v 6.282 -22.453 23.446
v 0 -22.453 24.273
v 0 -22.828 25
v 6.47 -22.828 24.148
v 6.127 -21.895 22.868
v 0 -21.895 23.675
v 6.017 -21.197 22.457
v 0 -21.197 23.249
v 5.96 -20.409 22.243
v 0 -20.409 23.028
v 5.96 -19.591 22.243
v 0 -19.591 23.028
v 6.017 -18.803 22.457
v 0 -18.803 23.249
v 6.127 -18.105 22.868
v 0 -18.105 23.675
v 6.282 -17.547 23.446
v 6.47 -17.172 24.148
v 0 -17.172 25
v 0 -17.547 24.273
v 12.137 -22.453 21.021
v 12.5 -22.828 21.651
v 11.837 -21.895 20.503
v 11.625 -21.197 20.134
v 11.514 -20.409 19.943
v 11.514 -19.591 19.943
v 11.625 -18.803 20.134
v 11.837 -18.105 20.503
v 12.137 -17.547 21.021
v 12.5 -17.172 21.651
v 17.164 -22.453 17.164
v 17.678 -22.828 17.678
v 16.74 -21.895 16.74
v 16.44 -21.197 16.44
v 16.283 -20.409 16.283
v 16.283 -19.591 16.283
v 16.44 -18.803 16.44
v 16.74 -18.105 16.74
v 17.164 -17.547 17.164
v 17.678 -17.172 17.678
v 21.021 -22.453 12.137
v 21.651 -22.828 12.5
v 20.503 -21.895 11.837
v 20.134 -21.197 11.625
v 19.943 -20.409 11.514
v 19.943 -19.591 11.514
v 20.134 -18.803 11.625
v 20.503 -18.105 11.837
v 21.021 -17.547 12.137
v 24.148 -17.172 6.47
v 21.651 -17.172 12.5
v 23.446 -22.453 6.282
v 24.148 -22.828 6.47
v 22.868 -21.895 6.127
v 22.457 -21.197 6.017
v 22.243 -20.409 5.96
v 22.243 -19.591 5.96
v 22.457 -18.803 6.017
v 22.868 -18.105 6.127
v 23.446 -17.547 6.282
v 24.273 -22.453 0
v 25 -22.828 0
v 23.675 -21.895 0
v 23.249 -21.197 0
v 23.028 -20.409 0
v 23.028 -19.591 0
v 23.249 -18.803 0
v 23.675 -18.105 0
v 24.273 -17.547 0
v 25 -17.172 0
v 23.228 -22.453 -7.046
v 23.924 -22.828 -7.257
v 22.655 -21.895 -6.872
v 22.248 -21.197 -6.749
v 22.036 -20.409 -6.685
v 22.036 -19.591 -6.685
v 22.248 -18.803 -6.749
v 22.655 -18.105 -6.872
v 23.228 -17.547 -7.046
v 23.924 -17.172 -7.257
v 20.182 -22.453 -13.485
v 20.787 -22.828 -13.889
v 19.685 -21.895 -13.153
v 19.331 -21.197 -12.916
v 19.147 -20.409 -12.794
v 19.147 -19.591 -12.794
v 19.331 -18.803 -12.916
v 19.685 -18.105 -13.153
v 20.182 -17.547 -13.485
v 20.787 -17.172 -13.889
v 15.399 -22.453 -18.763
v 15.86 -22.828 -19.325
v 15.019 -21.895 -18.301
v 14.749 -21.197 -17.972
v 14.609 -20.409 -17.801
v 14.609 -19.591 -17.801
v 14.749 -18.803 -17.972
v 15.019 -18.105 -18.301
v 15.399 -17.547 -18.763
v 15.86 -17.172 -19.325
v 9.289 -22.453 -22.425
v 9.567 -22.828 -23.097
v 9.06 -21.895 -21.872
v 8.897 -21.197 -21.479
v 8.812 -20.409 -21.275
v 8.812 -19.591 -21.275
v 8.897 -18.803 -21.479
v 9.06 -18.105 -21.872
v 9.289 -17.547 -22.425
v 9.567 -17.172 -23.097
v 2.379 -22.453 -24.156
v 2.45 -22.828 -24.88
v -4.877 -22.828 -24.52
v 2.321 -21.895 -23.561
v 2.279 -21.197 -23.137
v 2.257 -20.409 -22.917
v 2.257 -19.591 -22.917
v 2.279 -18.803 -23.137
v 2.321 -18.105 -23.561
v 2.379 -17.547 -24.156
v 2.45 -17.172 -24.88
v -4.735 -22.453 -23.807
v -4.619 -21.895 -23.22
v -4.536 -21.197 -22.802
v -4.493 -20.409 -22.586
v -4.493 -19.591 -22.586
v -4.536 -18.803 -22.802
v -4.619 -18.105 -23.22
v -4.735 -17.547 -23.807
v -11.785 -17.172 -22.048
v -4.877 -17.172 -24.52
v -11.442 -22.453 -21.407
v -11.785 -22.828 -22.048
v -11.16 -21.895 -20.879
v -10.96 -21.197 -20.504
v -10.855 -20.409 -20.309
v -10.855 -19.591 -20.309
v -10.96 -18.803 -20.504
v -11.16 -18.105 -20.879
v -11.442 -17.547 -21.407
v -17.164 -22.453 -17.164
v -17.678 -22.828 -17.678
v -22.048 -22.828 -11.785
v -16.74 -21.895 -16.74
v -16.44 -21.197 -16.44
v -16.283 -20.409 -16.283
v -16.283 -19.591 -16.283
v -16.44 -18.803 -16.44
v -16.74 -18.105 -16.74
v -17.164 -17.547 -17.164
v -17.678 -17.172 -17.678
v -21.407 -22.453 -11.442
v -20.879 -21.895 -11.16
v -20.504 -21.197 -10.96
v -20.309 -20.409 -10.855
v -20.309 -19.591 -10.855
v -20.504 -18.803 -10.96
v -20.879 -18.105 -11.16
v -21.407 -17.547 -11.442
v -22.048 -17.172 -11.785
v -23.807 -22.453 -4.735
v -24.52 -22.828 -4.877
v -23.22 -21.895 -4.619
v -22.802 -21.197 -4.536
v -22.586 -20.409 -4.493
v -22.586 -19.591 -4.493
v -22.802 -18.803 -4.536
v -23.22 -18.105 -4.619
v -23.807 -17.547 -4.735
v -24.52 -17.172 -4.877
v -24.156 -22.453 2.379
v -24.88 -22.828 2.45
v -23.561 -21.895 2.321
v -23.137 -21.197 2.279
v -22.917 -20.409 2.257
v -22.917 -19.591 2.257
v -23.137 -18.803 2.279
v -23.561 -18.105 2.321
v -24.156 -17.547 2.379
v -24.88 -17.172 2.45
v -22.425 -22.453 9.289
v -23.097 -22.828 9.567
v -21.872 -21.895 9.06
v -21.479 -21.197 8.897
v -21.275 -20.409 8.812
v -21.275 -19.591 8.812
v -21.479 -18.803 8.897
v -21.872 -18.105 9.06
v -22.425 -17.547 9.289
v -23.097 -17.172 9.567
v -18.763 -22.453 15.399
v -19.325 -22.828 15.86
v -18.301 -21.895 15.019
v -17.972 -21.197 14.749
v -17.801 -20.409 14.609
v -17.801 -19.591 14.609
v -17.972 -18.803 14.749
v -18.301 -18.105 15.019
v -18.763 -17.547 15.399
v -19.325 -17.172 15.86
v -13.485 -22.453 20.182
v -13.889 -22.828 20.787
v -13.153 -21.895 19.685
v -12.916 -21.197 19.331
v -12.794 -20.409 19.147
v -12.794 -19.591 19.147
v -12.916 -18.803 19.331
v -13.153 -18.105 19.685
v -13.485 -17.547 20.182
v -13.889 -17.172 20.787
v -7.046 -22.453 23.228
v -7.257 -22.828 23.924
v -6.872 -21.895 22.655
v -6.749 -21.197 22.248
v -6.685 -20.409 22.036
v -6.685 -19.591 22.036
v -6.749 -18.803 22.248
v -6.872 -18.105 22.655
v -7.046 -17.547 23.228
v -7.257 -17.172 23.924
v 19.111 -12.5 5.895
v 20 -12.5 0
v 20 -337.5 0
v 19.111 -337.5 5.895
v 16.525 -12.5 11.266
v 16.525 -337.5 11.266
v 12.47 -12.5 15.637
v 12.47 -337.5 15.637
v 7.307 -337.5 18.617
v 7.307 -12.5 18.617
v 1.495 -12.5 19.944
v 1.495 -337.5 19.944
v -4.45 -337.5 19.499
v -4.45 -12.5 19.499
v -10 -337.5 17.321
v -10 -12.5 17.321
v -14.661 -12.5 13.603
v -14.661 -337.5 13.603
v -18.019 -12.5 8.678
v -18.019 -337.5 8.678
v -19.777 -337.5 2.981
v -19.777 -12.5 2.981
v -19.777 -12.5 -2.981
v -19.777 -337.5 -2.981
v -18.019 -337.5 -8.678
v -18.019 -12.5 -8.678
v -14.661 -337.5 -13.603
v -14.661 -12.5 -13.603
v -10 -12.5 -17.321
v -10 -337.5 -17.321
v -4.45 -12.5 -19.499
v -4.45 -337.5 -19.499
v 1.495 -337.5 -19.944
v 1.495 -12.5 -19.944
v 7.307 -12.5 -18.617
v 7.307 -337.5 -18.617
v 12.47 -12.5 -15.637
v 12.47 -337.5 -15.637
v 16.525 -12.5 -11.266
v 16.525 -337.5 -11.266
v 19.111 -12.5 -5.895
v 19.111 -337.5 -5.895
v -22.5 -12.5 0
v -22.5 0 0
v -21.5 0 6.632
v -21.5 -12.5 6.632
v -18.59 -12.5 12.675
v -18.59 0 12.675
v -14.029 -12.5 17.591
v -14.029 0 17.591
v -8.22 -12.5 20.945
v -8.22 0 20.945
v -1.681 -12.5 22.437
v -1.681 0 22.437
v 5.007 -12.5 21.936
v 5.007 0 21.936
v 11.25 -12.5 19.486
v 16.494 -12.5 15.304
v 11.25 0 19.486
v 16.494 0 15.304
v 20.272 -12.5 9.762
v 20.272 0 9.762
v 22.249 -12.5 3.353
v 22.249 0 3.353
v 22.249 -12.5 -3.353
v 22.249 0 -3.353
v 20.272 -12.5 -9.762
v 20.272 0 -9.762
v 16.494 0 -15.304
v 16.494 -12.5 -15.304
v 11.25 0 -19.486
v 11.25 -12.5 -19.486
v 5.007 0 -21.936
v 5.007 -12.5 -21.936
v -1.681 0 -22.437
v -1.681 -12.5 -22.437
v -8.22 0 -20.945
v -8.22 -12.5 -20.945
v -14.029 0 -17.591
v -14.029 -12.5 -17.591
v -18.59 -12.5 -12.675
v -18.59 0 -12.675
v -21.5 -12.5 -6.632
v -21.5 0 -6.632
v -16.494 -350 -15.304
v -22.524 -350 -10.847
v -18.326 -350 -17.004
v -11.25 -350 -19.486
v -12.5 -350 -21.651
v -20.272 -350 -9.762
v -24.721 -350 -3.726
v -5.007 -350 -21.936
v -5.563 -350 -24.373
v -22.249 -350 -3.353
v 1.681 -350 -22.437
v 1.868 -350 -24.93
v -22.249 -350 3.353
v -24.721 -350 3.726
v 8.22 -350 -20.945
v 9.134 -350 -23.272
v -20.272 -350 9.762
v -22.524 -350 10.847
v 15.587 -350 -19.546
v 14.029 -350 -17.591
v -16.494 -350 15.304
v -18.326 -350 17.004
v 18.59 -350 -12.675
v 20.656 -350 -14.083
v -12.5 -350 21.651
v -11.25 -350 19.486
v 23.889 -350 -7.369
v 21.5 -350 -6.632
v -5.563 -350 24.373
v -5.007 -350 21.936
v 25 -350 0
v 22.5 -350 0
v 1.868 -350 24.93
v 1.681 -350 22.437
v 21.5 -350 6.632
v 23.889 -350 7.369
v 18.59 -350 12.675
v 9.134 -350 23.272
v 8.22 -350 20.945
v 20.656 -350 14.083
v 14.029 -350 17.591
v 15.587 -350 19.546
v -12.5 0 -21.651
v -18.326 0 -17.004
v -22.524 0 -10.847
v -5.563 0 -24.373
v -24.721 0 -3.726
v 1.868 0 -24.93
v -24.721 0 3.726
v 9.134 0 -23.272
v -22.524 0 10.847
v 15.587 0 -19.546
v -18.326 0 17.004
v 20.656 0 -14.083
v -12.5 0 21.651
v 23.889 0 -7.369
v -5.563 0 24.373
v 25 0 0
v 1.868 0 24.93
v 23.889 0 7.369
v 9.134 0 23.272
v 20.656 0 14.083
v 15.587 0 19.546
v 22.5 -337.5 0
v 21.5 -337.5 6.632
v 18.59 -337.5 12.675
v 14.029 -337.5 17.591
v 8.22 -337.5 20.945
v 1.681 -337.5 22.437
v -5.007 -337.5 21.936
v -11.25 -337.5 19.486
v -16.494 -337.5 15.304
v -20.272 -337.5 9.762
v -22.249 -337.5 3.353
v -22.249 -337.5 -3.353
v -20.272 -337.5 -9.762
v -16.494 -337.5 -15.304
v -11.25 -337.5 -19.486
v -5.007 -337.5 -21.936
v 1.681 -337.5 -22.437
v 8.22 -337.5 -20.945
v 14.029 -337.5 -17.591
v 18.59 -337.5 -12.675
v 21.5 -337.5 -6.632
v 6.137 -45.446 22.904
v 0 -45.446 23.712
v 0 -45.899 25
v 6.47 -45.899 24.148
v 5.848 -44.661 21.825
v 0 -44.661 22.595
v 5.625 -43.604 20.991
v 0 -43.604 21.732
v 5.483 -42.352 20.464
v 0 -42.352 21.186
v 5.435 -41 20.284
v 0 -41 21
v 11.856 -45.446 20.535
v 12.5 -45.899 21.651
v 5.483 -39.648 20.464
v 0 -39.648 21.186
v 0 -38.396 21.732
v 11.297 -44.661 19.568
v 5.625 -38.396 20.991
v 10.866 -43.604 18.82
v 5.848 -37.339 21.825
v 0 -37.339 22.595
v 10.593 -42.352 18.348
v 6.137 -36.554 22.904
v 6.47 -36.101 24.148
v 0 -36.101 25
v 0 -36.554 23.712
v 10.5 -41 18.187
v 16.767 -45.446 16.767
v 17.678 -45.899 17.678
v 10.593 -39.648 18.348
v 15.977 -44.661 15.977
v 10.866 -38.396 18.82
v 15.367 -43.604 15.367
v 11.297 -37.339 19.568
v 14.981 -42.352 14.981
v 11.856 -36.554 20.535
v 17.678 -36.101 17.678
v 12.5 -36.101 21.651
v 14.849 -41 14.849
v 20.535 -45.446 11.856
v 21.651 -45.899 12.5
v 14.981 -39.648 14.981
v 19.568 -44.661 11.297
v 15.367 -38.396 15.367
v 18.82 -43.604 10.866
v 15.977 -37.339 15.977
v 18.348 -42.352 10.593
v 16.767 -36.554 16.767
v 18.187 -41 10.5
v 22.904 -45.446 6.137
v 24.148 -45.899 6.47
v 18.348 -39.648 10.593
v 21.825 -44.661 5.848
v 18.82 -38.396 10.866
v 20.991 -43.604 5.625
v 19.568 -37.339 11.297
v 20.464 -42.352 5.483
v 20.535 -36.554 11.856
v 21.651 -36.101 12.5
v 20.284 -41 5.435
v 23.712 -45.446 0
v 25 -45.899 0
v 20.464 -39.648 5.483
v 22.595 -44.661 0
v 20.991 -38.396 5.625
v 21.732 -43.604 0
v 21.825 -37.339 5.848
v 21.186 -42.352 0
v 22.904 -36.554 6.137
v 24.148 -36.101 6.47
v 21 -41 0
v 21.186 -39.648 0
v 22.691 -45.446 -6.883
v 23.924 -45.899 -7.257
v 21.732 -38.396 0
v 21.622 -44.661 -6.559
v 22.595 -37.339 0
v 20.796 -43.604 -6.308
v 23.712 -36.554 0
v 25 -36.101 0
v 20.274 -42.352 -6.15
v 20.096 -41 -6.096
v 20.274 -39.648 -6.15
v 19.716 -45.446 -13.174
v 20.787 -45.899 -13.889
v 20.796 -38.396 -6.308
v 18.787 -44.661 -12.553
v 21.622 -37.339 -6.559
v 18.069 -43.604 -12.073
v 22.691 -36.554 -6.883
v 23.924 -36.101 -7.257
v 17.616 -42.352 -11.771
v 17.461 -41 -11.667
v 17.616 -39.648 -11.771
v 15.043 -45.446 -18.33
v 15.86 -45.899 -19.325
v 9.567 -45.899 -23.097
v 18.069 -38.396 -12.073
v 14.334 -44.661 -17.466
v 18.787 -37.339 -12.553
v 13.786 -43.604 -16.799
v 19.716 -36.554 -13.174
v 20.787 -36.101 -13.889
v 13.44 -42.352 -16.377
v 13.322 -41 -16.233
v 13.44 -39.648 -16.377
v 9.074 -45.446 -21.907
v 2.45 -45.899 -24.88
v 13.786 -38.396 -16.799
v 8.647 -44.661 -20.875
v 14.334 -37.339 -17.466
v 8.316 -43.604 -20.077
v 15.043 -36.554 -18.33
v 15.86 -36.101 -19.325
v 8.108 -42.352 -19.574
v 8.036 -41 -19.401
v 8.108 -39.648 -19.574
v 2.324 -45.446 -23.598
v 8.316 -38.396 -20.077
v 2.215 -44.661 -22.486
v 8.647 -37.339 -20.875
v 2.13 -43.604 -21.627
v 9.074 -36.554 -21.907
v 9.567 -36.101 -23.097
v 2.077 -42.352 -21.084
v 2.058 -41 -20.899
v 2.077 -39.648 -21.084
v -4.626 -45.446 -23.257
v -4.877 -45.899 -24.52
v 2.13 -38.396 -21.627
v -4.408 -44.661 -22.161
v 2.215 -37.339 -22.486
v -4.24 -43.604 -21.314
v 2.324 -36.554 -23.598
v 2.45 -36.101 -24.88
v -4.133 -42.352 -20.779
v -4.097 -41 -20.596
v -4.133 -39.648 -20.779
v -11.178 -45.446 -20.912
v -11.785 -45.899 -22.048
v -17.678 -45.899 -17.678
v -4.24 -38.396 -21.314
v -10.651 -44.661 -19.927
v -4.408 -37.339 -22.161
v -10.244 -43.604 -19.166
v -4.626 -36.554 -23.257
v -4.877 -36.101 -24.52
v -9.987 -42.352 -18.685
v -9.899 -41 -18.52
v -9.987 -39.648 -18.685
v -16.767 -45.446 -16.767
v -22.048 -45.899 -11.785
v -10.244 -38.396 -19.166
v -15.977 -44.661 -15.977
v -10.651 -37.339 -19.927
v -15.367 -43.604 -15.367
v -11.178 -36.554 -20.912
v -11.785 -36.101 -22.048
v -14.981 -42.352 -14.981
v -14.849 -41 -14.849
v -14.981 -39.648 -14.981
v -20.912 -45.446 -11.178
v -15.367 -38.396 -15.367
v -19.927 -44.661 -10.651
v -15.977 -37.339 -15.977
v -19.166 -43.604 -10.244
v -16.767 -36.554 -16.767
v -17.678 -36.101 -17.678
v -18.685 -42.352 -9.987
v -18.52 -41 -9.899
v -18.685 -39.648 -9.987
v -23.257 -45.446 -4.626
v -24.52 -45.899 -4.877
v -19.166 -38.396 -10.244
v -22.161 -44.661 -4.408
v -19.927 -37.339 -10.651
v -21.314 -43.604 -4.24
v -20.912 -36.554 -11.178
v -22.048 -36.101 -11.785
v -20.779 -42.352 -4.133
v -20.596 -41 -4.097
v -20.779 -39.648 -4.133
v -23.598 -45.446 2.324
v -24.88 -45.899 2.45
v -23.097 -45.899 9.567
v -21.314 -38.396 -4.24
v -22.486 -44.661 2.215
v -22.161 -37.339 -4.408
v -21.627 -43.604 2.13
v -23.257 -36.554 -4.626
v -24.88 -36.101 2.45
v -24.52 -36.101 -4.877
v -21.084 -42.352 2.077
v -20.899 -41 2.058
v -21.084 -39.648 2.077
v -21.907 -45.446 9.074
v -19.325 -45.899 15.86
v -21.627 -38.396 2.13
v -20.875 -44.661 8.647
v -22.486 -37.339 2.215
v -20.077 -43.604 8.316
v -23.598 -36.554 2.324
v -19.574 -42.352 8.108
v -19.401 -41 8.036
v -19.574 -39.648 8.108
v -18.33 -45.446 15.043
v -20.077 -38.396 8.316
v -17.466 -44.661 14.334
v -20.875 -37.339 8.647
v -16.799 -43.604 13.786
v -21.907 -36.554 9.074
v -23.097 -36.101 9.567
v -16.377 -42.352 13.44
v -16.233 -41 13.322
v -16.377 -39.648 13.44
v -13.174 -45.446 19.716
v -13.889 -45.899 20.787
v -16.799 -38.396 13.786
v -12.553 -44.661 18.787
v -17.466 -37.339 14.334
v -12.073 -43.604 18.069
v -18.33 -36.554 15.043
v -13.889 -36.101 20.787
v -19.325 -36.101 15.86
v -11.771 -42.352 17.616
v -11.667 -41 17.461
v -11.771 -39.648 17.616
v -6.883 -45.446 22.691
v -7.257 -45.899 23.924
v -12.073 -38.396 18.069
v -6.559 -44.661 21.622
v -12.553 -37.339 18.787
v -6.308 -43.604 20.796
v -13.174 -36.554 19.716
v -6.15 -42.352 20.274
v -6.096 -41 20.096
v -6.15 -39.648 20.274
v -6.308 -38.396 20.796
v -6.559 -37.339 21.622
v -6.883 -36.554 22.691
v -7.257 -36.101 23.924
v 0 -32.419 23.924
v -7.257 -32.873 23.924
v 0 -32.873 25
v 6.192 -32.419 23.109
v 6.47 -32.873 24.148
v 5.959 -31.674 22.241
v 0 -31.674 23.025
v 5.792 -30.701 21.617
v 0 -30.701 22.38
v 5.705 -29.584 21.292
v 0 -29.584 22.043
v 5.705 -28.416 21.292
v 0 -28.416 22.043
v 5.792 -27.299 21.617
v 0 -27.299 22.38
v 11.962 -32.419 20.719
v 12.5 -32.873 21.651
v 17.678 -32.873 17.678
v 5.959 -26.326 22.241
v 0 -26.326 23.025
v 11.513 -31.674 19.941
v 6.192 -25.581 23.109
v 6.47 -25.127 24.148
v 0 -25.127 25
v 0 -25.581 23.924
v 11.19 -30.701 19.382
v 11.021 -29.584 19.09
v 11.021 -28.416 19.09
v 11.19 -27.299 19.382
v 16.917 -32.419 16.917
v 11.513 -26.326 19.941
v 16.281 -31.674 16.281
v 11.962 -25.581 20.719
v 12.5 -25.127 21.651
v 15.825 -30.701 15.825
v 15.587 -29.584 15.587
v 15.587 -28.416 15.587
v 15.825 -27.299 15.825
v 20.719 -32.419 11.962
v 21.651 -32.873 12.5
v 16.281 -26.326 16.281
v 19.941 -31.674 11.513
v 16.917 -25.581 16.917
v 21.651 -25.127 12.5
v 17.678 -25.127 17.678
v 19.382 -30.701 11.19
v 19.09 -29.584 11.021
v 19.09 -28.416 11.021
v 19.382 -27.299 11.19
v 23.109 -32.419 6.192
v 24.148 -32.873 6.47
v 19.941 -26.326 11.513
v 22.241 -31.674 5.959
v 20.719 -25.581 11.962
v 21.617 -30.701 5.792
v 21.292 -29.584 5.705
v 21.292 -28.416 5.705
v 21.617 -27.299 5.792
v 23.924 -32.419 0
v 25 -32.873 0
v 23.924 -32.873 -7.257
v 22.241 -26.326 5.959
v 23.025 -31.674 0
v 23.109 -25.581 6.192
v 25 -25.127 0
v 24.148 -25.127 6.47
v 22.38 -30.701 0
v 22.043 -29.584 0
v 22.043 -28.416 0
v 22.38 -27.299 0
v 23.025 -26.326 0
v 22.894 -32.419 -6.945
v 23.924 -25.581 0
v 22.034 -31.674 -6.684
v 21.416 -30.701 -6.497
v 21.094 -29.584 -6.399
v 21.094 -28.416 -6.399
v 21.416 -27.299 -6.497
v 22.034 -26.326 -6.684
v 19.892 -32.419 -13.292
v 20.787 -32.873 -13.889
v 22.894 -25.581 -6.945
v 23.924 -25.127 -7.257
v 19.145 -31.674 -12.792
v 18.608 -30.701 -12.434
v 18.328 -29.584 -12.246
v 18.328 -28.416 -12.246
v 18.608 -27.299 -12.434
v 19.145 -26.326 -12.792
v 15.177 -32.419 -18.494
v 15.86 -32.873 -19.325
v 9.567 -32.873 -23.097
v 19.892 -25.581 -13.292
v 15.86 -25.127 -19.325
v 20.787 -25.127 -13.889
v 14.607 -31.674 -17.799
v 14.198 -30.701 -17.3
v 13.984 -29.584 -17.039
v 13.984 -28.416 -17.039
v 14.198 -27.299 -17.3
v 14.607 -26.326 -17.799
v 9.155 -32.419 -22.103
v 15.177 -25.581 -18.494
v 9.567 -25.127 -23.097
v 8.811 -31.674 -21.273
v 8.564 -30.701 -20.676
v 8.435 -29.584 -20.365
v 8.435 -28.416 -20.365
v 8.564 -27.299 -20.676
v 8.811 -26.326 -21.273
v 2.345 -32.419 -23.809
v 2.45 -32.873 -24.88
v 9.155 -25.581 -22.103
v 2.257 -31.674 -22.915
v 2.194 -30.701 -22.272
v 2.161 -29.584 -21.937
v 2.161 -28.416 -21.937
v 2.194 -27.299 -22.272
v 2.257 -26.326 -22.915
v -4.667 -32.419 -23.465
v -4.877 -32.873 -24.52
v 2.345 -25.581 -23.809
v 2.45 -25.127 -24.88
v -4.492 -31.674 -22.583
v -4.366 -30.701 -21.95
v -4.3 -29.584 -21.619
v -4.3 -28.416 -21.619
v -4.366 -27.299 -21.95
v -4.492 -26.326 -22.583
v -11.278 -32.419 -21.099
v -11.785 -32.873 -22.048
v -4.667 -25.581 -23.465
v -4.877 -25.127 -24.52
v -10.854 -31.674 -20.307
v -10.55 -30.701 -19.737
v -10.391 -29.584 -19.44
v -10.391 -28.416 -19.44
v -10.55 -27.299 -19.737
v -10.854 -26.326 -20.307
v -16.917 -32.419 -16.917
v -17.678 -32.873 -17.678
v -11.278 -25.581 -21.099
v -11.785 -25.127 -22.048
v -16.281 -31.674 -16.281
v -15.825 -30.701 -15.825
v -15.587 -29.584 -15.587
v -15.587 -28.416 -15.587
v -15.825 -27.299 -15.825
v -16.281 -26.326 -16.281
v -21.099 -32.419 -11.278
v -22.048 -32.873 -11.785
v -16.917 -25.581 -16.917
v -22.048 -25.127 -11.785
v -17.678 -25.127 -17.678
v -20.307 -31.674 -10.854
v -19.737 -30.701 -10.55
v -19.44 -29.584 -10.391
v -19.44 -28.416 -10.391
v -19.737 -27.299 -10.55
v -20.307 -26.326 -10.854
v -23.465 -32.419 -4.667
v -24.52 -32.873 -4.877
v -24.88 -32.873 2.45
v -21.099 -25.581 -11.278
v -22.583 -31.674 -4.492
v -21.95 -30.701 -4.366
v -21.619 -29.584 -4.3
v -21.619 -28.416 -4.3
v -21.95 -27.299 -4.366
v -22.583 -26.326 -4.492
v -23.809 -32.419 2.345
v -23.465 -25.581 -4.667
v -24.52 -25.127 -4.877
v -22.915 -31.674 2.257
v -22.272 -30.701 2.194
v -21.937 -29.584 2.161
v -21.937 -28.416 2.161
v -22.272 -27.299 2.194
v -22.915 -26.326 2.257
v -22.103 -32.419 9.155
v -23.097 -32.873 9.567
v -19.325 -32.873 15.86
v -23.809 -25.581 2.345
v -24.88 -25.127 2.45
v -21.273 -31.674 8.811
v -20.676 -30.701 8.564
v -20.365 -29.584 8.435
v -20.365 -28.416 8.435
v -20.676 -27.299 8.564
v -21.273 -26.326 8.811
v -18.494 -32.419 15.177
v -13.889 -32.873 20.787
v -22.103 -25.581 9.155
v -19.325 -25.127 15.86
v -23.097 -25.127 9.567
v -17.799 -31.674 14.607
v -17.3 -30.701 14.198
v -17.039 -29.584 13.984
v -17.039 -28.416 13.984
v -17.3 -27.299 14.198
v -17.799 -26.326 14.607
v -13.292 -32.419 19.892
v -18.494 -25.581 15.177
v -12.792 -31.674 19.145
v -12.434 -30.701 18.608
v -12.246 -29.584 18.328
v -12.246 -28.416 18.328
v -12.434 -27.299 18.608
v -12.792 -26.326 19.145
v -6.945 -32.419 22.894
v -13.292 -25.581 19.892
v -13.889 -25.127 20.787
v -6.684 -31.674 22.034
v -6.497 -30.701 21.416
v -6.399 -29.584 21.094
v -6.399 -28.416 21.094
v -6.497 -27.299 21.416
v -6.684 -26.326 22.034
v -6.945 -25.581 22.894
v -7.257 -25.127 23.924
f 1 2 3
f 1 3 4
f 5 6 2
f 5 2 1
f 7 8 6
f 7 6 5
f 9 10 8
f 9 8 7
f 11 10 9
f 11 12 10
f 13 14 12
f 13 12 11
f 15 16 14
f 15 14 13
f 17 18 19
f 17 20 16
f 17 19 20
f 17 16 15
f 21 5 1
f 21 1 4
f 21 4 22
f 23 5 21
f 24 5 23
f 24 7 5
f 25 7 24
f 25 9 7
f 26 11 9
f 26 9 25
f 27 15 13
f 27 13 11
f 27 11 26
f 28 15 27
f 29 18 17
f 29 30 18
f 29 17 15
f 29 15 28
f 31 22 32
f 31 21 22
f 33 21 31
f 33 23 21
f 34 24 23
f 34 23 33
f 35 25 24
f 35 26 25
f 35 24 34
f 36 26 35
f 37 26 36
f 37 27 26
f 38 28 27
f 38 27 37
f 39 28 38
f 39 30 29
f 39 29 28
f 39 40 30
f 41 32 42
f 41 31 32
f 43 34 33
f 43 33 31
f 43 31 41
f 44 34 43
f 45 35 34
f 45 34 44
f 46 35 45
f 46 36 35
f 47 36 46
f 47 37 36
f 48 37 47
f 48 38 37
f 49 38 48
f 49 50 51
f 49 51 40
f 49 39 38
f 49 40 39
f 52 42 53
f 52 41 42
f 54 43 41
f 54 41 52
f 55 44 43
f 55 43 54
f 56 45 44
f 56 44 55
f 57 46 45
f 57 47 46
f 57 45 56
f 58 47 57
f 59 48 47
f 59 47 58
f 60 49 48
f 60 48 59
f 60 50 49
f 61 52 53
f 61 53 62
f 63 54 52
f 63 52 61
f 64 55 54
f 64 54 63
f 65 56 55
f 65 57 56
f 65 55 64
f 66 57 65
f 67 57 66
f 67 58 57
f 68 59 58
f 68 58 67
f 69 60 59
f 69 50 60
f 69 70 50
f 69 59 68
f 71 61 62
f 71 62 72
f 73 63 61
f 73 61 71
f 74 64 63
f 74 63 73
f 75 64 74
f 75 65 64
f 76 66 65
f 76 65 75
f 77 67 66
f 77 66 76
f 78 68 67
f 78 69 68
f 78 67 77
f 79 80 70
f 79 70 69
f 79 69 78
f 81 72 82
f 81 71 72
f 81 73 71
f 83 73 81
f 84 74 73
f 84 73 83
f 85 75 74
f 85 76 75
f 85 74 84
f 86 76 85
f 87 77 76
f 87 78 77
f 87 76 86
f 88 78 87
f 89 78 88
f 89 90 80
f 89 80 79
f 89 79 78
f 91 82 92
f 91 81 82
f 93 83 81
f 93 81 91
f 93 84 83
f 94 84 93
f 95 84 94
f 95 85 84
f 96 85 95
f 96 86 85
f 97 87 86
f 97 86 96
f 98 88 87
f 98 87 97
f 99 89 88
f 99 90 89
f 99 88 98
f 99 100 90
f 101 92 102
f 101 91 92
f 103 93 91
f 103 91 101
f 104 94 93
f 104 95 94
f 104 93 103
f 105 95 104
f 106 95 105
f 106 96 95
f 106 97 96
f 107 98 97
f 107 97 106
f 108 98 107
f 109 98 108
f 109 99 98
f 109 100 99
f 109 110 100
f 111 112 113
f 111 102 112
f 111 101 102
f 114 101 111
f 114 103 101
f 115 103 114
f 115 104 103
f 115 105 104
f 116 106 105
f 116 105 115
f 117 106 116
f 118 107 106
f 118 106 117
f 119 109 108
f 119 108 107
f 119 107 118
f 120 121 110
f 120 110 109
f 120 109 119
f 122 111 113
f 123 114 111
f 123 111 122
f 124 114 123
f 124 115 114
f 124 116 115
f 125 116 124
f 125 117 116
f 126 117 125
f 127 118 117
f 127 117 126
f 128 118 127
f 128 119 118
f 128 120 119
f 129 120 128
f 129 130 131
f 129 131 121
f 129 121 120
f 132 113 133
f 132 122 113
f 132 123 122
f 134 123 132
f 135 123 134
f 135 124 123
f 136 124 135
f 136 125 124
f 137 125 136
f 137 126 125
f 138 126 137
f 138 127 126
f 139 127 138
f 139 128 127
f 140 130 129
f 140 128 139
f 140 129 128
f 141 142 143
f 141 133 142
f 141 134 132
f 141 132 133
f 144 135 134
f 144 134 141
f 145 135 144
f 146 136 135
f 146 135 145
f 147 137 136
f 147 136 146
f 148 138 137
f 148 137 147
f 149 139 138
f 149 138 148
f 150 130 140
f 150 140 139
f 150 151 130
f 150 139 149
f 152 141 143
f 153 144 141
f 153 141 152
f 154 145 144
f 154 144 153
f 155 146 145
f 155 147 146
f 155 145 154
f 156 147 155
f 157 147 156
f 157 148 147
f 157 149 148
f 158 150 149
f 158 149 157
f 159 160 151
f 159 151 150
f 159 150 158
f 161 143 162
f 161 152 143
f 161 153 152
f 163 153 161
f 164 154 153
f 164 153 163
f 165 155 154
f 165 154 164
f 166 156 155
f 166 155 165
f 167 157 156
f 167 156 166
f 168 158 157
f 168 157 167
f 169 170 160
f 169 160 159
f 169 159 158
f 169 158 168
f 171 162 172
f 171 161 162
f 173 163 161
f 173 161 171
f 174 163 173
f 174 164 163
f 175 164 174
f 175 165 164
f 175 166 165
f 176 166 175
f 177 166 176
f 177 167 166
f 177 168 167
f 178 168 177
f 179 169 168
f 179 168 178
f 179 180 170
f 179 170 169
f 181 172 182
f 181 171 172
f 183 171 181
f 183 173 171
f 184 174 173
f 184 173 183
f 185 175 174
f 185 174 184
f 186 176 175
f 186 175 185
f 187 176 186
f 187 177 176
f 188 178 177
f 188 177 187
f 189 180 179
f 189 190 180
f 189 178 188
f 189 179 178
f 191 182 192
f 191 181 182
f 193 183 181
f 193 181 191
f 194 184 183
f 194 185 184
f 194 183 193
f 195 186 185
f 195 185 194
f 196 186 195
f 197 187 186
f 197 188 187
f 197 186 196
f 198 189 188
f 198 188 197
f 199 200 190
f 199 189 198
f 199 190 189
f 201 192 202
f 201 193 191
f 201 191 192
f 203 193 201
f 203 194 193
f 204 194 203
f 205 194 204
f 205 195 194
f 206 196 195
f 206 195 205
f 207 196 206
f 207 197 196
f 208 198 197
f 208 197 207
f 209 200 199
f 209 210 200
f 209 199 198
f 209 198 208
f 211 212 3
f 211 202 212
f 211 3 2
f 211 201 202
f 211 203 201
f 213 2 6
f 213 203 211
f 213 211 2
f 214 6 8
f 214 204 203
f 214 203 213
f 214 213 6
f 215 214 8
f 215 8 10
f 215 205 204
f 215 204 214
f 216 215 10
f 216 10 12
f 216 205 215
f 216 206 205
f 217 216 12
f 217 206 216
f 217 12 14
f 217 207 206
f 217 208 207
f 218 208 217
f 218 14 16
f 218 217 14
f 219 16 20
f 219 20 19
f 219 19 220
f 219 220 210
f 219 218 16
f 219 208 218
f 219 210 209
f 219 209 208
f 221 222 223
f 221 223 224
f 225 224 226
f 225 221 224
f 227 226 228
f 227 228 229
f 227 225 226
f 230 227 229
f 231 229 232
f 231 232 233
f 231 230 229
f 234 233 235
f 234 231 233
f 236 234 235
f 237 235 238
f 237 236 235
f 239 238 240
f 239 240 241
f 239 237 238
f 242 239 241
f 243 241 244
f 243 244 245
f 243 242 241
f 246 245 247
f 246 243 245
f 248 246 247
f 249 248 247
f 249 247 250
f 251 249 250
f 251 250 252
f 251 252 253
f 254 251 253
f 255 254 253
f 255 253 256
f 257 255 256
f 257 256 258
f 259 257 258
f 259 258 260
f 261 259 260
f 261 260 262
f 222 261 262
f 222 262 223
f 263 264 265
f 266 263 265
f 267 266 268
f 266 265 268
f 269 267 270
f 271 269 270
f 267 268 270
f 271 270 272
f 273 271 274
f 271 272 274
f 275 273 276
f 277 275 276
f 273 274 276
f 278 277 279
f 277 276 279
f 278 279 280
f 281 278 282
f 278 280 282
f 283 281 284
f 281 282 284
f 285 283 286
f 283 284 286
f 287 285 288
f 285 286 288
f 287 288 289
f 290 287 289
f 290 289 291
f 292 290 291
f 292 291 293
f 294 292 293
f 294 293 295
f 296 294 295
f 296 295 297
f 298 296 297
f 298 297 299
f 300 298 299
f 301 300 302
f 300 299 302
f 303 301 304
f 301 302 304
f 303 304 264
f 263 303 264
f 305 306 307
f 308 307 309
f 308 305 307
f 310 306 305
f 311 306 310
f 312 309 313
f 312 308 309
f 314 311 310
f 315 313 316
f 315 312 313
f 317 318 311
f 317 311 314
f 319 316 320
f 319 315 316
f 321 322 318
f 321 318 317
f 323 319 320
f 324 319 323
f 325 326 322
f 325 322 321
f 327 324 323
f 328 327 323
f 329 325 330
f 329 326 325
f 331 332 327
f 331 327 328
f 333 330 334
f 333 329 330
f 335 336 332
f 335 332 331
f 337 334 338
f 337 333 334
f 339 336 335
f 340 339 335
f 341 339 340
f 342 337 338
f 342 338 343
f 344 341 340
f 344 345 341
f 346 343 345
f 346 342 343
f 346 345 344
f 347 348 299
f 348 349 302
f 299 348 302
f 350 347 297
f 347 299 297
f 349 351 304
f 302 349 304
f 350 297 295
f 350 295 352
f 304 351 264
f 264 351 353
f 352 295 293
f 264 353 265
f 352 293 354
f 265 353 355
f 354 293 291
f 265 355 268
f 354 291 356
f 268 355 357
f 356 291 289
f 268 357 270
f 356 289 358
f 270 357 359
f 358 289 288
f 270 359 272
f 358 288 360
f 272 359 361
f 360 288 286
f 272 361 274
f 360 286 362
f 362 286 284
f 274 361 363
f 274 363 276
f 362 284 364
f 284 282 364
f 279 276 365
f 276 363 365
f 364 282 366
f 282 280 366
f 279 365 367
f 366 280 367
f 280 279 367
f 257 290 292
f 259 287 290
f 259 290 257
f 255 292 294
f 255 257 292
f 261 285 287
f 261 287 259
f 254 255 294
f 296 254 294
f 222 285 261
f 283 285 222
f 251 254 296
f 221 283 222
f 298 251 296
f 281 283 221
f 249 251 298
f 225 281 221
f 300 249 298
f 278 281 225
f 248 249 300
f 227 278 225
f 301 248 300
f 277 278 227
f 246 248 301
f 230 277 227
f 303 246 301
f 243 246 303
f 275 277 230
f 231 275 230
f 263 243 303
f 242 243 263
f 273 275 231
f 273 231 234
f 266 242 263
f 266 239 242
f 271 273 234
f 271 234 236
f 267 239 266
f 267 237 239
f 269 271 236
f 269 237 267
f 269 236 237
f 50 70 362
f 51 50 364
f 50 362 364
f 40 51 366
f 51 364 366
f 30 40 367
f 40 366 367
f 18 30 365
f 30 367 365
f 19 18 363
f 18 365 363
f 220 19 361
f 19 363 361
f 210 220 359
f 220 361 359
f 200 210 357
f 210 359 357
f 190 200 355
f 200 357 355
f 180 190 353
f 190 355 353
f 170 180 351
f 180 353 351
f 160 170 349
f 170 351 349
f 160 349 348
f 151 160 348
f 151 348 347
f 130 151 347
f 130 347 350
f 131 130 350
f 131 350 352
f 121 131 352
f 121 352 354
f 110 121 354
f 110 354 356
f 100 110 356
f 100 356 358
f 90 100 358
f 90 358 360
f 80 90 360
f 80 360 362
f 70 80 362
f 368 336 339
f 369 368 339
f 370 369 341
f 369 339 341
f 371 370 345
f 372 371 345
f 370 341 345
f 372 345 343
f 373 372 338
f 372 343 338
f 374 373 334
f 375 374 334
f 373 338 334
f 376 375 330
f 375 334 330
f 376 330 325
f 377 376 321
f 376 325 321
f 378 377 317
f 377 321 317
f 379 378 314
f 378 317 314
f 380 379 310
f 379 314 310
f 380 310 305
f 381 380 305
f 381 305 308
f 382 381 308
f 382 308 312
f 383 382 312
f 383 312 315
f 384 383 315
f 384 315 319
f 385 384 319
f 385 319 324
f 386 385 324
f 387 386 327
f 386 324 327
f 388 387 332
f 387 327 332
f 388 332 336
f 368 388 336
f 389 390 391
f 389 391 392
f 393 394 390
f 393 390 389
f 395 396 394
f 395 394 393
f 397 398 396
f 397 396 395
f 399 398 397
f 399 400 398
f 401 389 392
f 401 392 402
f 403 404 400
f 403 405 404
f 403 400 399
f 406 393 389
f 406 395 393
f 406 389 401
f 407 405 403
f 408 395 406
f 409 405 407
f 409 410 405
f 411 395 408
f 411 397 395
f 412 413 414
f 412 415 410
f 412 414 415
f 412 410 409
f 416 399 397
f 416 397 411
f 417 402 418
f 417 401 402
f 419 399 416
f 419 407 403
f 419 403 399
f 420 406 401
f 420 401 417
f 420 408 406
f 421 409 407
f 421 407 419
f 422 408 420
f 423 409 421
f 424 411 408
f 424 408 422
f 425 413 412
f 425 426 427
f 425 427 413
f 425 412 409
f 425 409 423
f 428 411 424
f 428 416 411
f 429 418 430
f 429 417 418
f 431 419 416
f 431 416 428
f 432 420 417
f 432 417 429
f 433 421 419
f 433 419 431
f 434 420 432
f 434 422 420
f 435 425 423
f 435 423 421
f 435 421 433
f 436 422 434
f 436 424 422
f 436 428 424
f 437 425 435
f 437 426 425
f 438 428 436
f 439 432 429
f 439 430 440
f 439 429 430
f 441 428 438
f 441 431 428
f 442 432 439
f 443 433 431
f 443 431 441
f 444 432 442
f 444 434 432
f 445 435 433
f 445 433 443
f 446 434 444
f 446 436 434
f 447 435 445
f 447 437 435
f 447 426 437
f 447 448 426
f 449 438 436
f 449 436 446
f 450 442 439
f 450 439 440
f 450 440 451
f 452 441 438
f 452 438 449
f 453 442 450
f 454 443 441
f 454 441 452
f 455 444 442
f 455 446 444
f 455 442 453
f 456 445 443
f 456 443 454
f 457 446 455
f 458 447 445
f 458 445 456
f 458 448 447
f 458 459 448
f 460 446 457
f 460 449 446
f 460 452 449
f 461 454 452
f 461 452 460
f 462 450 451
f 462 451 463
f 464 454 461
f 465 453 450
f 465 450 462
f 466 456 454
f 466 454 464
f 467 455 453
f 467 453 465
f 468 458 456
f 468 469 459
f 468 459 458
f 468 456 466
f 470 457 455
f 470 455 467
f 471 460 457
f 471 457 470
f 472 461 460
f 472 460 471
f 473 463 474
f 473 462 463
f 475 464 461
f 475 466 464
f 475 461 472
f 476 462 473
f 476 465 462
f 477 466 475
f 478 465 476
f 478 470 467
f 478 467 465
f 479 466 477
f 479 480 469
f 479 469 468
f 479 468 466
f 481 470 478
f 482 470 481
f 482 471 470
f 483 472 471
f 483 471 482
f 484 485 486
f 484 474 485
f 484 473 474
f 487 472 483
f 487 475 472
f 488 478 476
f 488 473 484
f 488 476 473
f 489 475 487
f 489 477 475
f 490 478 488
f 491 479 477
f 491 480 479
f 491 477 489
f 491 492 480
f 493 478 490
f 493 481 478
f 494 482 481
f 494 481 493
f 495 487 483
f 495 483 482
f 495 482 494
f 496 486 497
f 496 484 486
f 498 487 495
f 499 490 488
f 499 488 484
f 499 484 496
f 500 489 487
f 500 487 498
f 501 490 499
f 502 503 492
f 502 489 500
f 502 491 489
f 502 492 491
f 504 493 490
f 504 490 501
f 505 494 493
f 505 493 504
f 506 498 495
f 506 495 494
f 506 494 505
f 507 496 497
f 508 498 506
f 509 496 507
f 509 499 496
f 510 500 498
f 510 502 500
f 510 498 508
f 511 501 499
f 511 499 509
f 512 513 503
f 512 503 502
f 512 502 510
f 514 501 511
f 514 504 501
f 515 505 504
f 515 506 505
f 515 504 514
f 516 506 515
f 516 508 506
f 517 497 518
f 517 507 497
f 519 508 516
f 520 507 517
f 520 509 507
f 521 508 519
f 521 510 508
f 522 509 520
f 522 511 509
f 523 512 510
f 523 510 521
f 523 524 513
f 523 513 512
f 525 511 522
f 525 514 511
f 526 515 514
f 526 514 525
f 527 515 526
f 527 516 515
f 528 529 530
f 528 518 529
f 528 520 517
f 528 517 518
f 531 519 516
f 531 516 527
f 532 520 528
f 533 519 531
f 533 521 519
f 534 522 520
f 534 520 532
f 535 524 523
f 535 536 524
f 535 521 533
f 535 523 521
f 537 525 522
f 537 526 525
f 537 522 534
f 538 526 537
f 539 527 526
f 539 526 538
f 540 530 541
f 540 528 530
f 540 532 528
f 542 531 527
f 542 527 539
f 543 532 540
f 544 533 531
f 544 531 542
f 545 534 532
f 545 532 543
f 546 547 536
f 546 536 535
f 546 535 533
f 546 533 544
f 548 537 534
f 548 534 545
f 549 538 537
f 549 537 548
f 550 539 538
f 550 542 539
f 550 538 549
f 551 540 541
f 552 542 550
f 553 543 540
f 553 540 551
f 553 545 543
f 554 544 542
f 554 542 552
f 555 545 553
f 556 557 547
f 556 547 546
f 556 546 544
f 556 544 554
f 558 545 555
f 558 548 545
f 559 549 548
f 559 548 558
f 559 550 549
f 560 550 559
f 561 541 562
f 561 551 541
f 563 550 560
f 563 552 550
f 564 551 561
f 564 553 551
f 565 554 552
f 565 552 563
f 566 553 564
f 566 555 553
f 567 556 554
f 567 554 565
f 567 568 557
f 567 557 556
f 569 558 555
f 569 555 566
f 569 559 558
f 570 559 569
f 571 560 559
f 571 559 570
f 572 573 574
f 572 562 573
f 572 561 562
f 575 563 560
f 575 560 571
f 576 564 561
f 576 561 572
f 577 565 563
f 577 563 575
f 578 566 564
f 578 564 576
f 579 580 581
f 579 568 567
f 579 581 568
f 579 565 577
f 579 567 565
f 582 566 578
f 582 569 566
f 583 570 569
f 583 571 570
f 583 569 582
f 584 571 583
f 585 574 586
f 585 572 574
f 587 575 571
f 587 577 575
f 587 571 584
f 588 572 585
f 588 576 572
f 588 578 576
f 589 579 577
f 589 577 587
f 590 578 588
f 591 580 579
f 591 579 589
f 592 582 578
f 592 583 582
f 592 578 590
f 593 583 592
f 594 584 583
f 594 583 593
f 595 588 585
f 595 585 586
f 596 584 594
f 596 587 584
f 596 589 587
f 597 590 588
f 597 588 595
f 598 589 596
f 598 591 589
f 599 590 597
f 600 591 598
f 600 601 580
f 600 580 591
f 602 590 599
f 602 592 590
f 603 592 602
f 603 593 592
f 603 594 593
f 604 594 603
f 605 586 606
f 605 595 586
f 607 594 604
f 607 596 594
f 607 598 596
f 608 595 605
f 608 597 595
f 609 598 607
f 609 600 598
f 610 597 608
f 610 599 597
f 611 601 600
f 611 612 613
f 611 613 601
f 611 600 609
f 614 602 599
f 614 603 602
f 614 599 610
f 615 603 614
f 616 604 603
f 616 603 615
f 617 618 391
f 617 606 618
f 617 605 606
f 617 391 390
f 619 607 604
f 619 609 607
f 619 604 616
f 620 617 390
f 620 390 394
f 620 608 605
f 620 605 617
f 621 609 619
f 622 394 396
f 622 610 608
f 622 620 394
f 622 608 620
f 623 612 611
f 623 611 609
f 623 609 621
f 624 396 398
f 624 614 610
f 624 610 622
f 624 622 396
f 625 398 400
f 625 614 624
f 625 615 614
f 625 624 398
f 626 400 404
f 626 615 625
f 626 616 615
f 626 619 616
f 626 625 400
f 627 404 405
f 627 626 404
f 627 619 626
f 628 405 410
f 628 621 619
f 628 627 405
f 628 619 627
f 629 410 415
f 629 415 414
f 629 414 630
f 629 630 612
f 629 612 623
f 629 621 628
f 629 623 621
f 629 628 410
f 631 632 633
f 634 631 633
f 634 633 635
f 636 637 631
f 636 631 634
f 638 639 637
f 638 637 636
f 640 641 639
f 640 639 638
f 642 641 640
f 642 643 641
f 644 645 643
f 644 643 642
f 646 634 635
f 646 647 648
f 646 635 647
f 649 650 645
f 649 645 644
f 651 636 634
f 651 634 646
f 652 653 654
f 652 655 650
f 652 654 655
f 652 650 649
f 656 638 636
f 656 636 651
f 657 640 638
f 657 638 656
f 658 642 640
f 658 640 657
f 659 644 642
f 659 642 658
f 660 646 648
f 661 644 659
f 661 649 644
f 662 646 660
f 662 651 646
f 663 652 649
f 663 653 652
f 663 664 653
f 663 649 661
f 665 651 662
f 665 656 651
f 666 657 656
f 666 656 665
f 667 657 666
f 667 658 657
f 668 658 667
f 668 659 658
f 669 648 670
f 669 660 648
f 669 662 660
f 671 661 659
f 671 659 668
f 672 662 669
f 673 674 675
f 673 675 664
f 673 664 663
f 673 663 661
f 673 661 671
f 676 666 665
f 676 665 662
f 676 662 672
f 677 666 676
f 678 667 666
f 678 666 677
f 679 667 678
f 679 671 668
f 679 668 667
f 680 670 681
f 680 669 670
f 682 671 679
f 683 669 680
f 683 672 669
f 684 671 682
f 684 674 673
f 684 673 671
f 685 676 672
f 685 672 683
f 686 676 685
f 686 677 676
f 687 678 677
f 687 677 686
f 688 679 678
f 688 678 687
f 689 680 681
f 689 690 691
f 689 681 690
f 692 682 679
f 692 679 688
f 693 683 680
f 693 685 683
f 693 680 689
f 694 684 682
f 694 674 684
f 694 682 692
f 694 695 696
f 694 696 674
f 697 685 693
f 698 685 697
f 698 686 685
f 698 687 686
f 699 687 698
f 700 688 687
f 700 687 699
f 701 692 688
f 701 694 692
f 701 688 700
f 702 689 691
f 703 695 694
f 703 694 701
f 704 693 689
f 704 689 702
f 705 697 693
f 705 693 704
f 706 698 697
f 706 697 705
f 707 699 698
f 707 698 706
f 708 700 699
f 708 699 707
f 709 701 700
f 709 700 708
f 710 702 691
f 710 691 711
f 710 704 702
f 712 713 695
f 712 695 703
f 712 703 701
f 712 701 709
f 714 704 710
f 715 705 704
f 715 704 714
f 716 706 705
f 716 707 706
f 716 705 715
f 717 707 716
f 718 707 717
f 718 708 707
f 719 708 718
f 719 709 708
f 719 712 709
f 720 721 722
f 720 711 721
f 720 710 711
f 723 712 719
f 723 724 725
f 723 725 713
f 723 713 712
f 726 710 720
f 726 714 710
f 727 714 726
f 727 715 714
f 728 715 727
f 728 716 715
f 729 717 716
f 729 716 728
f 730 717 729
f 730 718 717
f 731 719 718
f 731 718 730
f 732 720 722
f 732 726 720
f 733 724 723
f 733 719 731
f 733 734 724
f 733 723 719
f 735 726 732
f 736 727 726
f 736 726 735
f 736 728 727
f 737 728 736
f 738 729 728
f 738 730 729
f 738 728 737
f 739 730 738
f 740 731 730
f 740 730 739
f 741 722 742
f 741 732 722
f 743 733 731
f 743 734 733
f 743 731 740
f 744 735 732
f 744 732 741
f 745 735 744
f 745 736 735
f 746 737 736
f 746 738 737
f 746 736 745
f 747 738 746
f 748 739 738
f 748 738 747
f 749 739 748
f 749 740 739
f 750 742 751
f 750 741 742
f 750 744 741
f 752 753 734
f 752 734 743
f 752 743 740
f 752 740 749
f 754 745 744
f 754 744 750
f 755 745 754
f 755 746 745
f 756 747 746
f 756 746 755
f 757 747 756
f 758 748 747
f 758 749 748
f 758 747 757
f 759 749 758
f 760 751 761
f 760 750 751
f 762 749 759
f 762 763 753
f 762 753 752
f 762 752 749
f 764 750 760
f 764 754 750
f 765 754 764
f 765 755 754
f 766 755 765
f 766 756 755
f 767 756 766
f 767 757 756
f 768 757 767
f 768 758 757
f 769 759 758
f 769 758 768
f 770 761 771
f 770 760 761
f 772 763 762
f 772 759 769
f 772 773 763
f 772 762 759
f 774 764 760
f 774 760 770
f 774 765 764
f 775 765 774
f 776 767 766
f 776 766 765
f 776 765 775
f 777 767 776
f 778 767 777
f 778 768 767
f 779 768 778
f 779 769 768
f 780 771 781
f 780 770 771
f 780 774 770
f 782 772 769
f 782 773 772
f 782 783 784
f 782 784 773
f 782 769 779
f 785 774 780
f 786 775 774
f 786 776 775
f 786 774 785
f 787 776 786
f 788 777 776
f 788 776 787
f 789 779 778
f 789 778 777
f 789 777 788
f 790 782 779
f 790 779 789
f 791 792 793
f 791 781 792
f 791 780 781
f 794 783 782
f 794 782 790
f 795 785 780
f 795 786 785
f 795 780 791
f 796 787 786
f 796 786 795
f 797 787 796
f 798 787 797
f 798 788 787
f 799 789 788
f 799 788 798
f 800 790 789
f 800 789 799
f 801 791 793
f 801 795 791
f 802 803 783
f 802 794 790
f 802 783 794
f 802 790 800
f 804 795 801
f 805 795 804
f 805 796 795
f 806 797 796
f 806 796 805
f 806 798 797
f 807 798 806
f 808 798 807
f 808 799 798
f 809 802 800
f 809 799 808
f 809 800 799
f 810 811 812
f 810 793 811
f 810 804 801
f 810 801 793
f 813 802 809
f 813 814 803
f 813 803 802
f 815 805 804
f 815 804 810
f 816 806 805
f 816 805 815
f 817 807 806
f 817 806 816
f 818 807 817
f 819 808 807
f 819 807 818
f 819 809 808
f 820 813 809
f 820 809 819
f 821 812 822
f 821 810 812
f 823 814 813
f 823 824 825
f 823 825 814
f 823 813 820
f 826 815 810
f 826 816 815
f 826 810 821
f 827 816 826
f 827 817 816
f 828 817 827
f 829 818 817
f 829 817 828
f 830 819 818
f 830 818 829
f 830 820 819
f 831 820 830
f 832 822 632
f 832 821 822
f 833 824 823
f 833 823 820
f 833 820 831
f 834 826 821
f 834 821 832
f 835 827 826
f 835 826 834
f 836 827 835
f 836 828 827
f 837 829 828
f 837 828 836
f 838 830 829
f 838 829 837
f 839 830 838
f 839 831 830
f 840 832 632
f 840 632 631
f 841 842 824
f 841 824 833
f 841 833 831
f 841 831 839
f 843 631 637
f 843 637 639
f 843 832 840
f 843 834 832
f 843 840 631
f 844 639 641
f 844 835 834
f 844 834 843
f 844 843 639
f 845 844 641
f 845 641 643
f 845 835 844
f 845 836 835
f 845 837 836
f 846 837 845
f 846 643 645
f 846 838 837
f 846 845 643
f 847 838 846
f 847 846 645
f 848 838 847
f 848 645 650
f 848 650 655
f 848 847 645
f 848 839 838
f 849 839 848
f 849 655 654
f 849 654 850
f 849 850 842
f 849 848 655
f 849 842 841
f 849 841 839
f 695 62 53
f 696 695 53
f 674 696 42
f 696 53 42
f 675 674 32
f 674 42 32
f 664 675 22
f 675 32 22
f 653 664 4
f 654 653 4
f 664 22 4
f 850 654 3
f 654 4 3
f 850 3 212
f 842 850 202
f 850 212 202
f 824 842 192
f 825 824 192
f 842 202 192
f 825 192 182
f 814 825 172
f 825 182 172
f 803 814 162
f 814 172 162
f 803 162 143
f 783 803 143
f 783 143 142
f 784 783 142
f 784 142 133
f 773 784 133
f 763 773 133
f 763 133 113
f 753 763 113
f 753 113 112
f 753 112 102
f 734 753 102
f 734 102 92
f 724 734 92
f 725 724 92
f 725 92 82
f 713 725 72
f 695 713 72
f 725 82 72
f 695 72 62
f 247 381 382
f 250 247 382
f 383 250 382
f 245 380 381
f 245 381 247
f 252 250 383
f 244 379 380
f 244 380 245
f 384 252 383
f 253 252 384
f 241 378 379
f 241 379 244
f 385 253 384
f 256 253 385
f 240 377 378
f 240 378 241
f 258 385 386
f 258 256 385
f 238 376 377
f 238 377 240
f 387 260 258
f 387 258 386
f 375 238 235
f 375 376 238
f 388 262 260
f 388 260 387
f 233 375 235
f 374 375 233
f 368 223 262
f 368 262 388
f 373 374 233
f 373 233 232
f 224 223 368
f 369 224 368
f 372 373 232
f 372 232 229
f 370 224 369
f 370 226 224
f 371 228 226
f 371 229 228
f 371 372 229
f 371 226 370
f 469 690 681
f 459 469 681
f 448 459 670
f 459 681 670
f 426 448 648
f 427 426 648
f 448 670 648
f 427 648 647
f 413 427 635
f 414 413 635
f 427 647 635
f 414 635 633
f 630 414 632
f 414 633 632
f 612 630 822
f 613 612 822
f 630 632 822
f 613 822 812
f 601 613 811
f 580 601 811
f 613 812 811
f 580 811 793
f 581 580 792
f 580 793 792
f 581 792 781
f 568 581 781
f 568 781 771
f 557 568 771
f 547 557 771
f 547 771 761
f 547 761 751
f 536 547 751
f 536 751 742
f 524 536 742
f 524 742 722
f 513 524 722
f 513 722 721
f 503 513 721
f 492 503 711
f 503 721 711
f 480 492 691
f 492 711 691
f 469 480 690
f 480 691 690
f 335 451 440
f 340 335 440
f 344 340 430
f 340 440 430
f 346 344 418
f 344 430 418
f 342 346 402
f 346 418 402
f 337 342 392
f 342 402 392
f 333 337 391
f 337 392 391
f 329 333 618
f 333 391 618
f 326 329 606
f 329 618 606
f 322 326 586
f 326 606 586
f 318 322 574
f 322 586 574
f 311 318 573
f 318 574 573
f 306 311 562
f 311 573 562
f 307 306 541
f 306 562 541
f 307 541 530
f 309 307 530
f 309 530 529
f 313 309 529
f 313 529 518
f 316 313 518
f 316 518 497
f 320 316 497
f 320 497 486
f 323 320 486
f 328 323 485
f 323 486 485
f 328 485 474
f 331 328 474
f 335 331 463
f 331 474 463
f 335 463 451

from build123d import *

# Parameters (mm, degrees)
F0_R     = 25
F0_R_2   = 20
F1_DEPTH = 350
F2_R     = 22.5
F2_R_2   = 20
F3_DEPTH = 12.5
F4_R     = 22.5
F4_R_2   = 20
F5_DEPTH = 12.5
F6_R     = 3
F6_R_2   = 4
F6_R_3   = 5


with BuildPart() as f1:
    # F0 (on Front) → F1 (new body)
    with BuildSketch(Plane.XZ):
        Circle(F0_R)
        Circle(F0_R_2, mode=Mode.SUBTRACT)
    extrude(amount=F1_DEPTH)

    # F2 (on face) → F3 (cut)
    with BuildSketch(Plane.XZ.offset(350)):
        Circle(F2_R)
        Circle(F2_R_2, mode=Mode.SUBTRACT)
    extrude(amount=-F3_DEPTH, mode=Mode.SUBTRACT)

    # F4 (on face) → F5 (cut)
    with BuildSketch(Plane(origin=(0, 0, 0), x_dir=(-1, 0, 0), z_dir=(0, 1, 0))):
        Circle(F4_R)
        Circle(F4_R_2, mode=Mode.SUBTRACT)
    extrude(amount=-F5_DEPTH, mode=Mode.SUBTRACT)

    # F6 (on Right) → F7 (revolve, cut)
    with BuildSketch(Plane.YZ):
        with Locations((-20, 26)):
            Circle(F6_R)
        with Locations((-29, 26)):
            Circle(F6_R_2)
        with Locations((-41, 26)):
            Circle(F6_R_3)
    revolve(axis=Axis((0, 0, 0), (0, 1, 0)), mode=Mode.SUBTRACT)


solid = f1.part
